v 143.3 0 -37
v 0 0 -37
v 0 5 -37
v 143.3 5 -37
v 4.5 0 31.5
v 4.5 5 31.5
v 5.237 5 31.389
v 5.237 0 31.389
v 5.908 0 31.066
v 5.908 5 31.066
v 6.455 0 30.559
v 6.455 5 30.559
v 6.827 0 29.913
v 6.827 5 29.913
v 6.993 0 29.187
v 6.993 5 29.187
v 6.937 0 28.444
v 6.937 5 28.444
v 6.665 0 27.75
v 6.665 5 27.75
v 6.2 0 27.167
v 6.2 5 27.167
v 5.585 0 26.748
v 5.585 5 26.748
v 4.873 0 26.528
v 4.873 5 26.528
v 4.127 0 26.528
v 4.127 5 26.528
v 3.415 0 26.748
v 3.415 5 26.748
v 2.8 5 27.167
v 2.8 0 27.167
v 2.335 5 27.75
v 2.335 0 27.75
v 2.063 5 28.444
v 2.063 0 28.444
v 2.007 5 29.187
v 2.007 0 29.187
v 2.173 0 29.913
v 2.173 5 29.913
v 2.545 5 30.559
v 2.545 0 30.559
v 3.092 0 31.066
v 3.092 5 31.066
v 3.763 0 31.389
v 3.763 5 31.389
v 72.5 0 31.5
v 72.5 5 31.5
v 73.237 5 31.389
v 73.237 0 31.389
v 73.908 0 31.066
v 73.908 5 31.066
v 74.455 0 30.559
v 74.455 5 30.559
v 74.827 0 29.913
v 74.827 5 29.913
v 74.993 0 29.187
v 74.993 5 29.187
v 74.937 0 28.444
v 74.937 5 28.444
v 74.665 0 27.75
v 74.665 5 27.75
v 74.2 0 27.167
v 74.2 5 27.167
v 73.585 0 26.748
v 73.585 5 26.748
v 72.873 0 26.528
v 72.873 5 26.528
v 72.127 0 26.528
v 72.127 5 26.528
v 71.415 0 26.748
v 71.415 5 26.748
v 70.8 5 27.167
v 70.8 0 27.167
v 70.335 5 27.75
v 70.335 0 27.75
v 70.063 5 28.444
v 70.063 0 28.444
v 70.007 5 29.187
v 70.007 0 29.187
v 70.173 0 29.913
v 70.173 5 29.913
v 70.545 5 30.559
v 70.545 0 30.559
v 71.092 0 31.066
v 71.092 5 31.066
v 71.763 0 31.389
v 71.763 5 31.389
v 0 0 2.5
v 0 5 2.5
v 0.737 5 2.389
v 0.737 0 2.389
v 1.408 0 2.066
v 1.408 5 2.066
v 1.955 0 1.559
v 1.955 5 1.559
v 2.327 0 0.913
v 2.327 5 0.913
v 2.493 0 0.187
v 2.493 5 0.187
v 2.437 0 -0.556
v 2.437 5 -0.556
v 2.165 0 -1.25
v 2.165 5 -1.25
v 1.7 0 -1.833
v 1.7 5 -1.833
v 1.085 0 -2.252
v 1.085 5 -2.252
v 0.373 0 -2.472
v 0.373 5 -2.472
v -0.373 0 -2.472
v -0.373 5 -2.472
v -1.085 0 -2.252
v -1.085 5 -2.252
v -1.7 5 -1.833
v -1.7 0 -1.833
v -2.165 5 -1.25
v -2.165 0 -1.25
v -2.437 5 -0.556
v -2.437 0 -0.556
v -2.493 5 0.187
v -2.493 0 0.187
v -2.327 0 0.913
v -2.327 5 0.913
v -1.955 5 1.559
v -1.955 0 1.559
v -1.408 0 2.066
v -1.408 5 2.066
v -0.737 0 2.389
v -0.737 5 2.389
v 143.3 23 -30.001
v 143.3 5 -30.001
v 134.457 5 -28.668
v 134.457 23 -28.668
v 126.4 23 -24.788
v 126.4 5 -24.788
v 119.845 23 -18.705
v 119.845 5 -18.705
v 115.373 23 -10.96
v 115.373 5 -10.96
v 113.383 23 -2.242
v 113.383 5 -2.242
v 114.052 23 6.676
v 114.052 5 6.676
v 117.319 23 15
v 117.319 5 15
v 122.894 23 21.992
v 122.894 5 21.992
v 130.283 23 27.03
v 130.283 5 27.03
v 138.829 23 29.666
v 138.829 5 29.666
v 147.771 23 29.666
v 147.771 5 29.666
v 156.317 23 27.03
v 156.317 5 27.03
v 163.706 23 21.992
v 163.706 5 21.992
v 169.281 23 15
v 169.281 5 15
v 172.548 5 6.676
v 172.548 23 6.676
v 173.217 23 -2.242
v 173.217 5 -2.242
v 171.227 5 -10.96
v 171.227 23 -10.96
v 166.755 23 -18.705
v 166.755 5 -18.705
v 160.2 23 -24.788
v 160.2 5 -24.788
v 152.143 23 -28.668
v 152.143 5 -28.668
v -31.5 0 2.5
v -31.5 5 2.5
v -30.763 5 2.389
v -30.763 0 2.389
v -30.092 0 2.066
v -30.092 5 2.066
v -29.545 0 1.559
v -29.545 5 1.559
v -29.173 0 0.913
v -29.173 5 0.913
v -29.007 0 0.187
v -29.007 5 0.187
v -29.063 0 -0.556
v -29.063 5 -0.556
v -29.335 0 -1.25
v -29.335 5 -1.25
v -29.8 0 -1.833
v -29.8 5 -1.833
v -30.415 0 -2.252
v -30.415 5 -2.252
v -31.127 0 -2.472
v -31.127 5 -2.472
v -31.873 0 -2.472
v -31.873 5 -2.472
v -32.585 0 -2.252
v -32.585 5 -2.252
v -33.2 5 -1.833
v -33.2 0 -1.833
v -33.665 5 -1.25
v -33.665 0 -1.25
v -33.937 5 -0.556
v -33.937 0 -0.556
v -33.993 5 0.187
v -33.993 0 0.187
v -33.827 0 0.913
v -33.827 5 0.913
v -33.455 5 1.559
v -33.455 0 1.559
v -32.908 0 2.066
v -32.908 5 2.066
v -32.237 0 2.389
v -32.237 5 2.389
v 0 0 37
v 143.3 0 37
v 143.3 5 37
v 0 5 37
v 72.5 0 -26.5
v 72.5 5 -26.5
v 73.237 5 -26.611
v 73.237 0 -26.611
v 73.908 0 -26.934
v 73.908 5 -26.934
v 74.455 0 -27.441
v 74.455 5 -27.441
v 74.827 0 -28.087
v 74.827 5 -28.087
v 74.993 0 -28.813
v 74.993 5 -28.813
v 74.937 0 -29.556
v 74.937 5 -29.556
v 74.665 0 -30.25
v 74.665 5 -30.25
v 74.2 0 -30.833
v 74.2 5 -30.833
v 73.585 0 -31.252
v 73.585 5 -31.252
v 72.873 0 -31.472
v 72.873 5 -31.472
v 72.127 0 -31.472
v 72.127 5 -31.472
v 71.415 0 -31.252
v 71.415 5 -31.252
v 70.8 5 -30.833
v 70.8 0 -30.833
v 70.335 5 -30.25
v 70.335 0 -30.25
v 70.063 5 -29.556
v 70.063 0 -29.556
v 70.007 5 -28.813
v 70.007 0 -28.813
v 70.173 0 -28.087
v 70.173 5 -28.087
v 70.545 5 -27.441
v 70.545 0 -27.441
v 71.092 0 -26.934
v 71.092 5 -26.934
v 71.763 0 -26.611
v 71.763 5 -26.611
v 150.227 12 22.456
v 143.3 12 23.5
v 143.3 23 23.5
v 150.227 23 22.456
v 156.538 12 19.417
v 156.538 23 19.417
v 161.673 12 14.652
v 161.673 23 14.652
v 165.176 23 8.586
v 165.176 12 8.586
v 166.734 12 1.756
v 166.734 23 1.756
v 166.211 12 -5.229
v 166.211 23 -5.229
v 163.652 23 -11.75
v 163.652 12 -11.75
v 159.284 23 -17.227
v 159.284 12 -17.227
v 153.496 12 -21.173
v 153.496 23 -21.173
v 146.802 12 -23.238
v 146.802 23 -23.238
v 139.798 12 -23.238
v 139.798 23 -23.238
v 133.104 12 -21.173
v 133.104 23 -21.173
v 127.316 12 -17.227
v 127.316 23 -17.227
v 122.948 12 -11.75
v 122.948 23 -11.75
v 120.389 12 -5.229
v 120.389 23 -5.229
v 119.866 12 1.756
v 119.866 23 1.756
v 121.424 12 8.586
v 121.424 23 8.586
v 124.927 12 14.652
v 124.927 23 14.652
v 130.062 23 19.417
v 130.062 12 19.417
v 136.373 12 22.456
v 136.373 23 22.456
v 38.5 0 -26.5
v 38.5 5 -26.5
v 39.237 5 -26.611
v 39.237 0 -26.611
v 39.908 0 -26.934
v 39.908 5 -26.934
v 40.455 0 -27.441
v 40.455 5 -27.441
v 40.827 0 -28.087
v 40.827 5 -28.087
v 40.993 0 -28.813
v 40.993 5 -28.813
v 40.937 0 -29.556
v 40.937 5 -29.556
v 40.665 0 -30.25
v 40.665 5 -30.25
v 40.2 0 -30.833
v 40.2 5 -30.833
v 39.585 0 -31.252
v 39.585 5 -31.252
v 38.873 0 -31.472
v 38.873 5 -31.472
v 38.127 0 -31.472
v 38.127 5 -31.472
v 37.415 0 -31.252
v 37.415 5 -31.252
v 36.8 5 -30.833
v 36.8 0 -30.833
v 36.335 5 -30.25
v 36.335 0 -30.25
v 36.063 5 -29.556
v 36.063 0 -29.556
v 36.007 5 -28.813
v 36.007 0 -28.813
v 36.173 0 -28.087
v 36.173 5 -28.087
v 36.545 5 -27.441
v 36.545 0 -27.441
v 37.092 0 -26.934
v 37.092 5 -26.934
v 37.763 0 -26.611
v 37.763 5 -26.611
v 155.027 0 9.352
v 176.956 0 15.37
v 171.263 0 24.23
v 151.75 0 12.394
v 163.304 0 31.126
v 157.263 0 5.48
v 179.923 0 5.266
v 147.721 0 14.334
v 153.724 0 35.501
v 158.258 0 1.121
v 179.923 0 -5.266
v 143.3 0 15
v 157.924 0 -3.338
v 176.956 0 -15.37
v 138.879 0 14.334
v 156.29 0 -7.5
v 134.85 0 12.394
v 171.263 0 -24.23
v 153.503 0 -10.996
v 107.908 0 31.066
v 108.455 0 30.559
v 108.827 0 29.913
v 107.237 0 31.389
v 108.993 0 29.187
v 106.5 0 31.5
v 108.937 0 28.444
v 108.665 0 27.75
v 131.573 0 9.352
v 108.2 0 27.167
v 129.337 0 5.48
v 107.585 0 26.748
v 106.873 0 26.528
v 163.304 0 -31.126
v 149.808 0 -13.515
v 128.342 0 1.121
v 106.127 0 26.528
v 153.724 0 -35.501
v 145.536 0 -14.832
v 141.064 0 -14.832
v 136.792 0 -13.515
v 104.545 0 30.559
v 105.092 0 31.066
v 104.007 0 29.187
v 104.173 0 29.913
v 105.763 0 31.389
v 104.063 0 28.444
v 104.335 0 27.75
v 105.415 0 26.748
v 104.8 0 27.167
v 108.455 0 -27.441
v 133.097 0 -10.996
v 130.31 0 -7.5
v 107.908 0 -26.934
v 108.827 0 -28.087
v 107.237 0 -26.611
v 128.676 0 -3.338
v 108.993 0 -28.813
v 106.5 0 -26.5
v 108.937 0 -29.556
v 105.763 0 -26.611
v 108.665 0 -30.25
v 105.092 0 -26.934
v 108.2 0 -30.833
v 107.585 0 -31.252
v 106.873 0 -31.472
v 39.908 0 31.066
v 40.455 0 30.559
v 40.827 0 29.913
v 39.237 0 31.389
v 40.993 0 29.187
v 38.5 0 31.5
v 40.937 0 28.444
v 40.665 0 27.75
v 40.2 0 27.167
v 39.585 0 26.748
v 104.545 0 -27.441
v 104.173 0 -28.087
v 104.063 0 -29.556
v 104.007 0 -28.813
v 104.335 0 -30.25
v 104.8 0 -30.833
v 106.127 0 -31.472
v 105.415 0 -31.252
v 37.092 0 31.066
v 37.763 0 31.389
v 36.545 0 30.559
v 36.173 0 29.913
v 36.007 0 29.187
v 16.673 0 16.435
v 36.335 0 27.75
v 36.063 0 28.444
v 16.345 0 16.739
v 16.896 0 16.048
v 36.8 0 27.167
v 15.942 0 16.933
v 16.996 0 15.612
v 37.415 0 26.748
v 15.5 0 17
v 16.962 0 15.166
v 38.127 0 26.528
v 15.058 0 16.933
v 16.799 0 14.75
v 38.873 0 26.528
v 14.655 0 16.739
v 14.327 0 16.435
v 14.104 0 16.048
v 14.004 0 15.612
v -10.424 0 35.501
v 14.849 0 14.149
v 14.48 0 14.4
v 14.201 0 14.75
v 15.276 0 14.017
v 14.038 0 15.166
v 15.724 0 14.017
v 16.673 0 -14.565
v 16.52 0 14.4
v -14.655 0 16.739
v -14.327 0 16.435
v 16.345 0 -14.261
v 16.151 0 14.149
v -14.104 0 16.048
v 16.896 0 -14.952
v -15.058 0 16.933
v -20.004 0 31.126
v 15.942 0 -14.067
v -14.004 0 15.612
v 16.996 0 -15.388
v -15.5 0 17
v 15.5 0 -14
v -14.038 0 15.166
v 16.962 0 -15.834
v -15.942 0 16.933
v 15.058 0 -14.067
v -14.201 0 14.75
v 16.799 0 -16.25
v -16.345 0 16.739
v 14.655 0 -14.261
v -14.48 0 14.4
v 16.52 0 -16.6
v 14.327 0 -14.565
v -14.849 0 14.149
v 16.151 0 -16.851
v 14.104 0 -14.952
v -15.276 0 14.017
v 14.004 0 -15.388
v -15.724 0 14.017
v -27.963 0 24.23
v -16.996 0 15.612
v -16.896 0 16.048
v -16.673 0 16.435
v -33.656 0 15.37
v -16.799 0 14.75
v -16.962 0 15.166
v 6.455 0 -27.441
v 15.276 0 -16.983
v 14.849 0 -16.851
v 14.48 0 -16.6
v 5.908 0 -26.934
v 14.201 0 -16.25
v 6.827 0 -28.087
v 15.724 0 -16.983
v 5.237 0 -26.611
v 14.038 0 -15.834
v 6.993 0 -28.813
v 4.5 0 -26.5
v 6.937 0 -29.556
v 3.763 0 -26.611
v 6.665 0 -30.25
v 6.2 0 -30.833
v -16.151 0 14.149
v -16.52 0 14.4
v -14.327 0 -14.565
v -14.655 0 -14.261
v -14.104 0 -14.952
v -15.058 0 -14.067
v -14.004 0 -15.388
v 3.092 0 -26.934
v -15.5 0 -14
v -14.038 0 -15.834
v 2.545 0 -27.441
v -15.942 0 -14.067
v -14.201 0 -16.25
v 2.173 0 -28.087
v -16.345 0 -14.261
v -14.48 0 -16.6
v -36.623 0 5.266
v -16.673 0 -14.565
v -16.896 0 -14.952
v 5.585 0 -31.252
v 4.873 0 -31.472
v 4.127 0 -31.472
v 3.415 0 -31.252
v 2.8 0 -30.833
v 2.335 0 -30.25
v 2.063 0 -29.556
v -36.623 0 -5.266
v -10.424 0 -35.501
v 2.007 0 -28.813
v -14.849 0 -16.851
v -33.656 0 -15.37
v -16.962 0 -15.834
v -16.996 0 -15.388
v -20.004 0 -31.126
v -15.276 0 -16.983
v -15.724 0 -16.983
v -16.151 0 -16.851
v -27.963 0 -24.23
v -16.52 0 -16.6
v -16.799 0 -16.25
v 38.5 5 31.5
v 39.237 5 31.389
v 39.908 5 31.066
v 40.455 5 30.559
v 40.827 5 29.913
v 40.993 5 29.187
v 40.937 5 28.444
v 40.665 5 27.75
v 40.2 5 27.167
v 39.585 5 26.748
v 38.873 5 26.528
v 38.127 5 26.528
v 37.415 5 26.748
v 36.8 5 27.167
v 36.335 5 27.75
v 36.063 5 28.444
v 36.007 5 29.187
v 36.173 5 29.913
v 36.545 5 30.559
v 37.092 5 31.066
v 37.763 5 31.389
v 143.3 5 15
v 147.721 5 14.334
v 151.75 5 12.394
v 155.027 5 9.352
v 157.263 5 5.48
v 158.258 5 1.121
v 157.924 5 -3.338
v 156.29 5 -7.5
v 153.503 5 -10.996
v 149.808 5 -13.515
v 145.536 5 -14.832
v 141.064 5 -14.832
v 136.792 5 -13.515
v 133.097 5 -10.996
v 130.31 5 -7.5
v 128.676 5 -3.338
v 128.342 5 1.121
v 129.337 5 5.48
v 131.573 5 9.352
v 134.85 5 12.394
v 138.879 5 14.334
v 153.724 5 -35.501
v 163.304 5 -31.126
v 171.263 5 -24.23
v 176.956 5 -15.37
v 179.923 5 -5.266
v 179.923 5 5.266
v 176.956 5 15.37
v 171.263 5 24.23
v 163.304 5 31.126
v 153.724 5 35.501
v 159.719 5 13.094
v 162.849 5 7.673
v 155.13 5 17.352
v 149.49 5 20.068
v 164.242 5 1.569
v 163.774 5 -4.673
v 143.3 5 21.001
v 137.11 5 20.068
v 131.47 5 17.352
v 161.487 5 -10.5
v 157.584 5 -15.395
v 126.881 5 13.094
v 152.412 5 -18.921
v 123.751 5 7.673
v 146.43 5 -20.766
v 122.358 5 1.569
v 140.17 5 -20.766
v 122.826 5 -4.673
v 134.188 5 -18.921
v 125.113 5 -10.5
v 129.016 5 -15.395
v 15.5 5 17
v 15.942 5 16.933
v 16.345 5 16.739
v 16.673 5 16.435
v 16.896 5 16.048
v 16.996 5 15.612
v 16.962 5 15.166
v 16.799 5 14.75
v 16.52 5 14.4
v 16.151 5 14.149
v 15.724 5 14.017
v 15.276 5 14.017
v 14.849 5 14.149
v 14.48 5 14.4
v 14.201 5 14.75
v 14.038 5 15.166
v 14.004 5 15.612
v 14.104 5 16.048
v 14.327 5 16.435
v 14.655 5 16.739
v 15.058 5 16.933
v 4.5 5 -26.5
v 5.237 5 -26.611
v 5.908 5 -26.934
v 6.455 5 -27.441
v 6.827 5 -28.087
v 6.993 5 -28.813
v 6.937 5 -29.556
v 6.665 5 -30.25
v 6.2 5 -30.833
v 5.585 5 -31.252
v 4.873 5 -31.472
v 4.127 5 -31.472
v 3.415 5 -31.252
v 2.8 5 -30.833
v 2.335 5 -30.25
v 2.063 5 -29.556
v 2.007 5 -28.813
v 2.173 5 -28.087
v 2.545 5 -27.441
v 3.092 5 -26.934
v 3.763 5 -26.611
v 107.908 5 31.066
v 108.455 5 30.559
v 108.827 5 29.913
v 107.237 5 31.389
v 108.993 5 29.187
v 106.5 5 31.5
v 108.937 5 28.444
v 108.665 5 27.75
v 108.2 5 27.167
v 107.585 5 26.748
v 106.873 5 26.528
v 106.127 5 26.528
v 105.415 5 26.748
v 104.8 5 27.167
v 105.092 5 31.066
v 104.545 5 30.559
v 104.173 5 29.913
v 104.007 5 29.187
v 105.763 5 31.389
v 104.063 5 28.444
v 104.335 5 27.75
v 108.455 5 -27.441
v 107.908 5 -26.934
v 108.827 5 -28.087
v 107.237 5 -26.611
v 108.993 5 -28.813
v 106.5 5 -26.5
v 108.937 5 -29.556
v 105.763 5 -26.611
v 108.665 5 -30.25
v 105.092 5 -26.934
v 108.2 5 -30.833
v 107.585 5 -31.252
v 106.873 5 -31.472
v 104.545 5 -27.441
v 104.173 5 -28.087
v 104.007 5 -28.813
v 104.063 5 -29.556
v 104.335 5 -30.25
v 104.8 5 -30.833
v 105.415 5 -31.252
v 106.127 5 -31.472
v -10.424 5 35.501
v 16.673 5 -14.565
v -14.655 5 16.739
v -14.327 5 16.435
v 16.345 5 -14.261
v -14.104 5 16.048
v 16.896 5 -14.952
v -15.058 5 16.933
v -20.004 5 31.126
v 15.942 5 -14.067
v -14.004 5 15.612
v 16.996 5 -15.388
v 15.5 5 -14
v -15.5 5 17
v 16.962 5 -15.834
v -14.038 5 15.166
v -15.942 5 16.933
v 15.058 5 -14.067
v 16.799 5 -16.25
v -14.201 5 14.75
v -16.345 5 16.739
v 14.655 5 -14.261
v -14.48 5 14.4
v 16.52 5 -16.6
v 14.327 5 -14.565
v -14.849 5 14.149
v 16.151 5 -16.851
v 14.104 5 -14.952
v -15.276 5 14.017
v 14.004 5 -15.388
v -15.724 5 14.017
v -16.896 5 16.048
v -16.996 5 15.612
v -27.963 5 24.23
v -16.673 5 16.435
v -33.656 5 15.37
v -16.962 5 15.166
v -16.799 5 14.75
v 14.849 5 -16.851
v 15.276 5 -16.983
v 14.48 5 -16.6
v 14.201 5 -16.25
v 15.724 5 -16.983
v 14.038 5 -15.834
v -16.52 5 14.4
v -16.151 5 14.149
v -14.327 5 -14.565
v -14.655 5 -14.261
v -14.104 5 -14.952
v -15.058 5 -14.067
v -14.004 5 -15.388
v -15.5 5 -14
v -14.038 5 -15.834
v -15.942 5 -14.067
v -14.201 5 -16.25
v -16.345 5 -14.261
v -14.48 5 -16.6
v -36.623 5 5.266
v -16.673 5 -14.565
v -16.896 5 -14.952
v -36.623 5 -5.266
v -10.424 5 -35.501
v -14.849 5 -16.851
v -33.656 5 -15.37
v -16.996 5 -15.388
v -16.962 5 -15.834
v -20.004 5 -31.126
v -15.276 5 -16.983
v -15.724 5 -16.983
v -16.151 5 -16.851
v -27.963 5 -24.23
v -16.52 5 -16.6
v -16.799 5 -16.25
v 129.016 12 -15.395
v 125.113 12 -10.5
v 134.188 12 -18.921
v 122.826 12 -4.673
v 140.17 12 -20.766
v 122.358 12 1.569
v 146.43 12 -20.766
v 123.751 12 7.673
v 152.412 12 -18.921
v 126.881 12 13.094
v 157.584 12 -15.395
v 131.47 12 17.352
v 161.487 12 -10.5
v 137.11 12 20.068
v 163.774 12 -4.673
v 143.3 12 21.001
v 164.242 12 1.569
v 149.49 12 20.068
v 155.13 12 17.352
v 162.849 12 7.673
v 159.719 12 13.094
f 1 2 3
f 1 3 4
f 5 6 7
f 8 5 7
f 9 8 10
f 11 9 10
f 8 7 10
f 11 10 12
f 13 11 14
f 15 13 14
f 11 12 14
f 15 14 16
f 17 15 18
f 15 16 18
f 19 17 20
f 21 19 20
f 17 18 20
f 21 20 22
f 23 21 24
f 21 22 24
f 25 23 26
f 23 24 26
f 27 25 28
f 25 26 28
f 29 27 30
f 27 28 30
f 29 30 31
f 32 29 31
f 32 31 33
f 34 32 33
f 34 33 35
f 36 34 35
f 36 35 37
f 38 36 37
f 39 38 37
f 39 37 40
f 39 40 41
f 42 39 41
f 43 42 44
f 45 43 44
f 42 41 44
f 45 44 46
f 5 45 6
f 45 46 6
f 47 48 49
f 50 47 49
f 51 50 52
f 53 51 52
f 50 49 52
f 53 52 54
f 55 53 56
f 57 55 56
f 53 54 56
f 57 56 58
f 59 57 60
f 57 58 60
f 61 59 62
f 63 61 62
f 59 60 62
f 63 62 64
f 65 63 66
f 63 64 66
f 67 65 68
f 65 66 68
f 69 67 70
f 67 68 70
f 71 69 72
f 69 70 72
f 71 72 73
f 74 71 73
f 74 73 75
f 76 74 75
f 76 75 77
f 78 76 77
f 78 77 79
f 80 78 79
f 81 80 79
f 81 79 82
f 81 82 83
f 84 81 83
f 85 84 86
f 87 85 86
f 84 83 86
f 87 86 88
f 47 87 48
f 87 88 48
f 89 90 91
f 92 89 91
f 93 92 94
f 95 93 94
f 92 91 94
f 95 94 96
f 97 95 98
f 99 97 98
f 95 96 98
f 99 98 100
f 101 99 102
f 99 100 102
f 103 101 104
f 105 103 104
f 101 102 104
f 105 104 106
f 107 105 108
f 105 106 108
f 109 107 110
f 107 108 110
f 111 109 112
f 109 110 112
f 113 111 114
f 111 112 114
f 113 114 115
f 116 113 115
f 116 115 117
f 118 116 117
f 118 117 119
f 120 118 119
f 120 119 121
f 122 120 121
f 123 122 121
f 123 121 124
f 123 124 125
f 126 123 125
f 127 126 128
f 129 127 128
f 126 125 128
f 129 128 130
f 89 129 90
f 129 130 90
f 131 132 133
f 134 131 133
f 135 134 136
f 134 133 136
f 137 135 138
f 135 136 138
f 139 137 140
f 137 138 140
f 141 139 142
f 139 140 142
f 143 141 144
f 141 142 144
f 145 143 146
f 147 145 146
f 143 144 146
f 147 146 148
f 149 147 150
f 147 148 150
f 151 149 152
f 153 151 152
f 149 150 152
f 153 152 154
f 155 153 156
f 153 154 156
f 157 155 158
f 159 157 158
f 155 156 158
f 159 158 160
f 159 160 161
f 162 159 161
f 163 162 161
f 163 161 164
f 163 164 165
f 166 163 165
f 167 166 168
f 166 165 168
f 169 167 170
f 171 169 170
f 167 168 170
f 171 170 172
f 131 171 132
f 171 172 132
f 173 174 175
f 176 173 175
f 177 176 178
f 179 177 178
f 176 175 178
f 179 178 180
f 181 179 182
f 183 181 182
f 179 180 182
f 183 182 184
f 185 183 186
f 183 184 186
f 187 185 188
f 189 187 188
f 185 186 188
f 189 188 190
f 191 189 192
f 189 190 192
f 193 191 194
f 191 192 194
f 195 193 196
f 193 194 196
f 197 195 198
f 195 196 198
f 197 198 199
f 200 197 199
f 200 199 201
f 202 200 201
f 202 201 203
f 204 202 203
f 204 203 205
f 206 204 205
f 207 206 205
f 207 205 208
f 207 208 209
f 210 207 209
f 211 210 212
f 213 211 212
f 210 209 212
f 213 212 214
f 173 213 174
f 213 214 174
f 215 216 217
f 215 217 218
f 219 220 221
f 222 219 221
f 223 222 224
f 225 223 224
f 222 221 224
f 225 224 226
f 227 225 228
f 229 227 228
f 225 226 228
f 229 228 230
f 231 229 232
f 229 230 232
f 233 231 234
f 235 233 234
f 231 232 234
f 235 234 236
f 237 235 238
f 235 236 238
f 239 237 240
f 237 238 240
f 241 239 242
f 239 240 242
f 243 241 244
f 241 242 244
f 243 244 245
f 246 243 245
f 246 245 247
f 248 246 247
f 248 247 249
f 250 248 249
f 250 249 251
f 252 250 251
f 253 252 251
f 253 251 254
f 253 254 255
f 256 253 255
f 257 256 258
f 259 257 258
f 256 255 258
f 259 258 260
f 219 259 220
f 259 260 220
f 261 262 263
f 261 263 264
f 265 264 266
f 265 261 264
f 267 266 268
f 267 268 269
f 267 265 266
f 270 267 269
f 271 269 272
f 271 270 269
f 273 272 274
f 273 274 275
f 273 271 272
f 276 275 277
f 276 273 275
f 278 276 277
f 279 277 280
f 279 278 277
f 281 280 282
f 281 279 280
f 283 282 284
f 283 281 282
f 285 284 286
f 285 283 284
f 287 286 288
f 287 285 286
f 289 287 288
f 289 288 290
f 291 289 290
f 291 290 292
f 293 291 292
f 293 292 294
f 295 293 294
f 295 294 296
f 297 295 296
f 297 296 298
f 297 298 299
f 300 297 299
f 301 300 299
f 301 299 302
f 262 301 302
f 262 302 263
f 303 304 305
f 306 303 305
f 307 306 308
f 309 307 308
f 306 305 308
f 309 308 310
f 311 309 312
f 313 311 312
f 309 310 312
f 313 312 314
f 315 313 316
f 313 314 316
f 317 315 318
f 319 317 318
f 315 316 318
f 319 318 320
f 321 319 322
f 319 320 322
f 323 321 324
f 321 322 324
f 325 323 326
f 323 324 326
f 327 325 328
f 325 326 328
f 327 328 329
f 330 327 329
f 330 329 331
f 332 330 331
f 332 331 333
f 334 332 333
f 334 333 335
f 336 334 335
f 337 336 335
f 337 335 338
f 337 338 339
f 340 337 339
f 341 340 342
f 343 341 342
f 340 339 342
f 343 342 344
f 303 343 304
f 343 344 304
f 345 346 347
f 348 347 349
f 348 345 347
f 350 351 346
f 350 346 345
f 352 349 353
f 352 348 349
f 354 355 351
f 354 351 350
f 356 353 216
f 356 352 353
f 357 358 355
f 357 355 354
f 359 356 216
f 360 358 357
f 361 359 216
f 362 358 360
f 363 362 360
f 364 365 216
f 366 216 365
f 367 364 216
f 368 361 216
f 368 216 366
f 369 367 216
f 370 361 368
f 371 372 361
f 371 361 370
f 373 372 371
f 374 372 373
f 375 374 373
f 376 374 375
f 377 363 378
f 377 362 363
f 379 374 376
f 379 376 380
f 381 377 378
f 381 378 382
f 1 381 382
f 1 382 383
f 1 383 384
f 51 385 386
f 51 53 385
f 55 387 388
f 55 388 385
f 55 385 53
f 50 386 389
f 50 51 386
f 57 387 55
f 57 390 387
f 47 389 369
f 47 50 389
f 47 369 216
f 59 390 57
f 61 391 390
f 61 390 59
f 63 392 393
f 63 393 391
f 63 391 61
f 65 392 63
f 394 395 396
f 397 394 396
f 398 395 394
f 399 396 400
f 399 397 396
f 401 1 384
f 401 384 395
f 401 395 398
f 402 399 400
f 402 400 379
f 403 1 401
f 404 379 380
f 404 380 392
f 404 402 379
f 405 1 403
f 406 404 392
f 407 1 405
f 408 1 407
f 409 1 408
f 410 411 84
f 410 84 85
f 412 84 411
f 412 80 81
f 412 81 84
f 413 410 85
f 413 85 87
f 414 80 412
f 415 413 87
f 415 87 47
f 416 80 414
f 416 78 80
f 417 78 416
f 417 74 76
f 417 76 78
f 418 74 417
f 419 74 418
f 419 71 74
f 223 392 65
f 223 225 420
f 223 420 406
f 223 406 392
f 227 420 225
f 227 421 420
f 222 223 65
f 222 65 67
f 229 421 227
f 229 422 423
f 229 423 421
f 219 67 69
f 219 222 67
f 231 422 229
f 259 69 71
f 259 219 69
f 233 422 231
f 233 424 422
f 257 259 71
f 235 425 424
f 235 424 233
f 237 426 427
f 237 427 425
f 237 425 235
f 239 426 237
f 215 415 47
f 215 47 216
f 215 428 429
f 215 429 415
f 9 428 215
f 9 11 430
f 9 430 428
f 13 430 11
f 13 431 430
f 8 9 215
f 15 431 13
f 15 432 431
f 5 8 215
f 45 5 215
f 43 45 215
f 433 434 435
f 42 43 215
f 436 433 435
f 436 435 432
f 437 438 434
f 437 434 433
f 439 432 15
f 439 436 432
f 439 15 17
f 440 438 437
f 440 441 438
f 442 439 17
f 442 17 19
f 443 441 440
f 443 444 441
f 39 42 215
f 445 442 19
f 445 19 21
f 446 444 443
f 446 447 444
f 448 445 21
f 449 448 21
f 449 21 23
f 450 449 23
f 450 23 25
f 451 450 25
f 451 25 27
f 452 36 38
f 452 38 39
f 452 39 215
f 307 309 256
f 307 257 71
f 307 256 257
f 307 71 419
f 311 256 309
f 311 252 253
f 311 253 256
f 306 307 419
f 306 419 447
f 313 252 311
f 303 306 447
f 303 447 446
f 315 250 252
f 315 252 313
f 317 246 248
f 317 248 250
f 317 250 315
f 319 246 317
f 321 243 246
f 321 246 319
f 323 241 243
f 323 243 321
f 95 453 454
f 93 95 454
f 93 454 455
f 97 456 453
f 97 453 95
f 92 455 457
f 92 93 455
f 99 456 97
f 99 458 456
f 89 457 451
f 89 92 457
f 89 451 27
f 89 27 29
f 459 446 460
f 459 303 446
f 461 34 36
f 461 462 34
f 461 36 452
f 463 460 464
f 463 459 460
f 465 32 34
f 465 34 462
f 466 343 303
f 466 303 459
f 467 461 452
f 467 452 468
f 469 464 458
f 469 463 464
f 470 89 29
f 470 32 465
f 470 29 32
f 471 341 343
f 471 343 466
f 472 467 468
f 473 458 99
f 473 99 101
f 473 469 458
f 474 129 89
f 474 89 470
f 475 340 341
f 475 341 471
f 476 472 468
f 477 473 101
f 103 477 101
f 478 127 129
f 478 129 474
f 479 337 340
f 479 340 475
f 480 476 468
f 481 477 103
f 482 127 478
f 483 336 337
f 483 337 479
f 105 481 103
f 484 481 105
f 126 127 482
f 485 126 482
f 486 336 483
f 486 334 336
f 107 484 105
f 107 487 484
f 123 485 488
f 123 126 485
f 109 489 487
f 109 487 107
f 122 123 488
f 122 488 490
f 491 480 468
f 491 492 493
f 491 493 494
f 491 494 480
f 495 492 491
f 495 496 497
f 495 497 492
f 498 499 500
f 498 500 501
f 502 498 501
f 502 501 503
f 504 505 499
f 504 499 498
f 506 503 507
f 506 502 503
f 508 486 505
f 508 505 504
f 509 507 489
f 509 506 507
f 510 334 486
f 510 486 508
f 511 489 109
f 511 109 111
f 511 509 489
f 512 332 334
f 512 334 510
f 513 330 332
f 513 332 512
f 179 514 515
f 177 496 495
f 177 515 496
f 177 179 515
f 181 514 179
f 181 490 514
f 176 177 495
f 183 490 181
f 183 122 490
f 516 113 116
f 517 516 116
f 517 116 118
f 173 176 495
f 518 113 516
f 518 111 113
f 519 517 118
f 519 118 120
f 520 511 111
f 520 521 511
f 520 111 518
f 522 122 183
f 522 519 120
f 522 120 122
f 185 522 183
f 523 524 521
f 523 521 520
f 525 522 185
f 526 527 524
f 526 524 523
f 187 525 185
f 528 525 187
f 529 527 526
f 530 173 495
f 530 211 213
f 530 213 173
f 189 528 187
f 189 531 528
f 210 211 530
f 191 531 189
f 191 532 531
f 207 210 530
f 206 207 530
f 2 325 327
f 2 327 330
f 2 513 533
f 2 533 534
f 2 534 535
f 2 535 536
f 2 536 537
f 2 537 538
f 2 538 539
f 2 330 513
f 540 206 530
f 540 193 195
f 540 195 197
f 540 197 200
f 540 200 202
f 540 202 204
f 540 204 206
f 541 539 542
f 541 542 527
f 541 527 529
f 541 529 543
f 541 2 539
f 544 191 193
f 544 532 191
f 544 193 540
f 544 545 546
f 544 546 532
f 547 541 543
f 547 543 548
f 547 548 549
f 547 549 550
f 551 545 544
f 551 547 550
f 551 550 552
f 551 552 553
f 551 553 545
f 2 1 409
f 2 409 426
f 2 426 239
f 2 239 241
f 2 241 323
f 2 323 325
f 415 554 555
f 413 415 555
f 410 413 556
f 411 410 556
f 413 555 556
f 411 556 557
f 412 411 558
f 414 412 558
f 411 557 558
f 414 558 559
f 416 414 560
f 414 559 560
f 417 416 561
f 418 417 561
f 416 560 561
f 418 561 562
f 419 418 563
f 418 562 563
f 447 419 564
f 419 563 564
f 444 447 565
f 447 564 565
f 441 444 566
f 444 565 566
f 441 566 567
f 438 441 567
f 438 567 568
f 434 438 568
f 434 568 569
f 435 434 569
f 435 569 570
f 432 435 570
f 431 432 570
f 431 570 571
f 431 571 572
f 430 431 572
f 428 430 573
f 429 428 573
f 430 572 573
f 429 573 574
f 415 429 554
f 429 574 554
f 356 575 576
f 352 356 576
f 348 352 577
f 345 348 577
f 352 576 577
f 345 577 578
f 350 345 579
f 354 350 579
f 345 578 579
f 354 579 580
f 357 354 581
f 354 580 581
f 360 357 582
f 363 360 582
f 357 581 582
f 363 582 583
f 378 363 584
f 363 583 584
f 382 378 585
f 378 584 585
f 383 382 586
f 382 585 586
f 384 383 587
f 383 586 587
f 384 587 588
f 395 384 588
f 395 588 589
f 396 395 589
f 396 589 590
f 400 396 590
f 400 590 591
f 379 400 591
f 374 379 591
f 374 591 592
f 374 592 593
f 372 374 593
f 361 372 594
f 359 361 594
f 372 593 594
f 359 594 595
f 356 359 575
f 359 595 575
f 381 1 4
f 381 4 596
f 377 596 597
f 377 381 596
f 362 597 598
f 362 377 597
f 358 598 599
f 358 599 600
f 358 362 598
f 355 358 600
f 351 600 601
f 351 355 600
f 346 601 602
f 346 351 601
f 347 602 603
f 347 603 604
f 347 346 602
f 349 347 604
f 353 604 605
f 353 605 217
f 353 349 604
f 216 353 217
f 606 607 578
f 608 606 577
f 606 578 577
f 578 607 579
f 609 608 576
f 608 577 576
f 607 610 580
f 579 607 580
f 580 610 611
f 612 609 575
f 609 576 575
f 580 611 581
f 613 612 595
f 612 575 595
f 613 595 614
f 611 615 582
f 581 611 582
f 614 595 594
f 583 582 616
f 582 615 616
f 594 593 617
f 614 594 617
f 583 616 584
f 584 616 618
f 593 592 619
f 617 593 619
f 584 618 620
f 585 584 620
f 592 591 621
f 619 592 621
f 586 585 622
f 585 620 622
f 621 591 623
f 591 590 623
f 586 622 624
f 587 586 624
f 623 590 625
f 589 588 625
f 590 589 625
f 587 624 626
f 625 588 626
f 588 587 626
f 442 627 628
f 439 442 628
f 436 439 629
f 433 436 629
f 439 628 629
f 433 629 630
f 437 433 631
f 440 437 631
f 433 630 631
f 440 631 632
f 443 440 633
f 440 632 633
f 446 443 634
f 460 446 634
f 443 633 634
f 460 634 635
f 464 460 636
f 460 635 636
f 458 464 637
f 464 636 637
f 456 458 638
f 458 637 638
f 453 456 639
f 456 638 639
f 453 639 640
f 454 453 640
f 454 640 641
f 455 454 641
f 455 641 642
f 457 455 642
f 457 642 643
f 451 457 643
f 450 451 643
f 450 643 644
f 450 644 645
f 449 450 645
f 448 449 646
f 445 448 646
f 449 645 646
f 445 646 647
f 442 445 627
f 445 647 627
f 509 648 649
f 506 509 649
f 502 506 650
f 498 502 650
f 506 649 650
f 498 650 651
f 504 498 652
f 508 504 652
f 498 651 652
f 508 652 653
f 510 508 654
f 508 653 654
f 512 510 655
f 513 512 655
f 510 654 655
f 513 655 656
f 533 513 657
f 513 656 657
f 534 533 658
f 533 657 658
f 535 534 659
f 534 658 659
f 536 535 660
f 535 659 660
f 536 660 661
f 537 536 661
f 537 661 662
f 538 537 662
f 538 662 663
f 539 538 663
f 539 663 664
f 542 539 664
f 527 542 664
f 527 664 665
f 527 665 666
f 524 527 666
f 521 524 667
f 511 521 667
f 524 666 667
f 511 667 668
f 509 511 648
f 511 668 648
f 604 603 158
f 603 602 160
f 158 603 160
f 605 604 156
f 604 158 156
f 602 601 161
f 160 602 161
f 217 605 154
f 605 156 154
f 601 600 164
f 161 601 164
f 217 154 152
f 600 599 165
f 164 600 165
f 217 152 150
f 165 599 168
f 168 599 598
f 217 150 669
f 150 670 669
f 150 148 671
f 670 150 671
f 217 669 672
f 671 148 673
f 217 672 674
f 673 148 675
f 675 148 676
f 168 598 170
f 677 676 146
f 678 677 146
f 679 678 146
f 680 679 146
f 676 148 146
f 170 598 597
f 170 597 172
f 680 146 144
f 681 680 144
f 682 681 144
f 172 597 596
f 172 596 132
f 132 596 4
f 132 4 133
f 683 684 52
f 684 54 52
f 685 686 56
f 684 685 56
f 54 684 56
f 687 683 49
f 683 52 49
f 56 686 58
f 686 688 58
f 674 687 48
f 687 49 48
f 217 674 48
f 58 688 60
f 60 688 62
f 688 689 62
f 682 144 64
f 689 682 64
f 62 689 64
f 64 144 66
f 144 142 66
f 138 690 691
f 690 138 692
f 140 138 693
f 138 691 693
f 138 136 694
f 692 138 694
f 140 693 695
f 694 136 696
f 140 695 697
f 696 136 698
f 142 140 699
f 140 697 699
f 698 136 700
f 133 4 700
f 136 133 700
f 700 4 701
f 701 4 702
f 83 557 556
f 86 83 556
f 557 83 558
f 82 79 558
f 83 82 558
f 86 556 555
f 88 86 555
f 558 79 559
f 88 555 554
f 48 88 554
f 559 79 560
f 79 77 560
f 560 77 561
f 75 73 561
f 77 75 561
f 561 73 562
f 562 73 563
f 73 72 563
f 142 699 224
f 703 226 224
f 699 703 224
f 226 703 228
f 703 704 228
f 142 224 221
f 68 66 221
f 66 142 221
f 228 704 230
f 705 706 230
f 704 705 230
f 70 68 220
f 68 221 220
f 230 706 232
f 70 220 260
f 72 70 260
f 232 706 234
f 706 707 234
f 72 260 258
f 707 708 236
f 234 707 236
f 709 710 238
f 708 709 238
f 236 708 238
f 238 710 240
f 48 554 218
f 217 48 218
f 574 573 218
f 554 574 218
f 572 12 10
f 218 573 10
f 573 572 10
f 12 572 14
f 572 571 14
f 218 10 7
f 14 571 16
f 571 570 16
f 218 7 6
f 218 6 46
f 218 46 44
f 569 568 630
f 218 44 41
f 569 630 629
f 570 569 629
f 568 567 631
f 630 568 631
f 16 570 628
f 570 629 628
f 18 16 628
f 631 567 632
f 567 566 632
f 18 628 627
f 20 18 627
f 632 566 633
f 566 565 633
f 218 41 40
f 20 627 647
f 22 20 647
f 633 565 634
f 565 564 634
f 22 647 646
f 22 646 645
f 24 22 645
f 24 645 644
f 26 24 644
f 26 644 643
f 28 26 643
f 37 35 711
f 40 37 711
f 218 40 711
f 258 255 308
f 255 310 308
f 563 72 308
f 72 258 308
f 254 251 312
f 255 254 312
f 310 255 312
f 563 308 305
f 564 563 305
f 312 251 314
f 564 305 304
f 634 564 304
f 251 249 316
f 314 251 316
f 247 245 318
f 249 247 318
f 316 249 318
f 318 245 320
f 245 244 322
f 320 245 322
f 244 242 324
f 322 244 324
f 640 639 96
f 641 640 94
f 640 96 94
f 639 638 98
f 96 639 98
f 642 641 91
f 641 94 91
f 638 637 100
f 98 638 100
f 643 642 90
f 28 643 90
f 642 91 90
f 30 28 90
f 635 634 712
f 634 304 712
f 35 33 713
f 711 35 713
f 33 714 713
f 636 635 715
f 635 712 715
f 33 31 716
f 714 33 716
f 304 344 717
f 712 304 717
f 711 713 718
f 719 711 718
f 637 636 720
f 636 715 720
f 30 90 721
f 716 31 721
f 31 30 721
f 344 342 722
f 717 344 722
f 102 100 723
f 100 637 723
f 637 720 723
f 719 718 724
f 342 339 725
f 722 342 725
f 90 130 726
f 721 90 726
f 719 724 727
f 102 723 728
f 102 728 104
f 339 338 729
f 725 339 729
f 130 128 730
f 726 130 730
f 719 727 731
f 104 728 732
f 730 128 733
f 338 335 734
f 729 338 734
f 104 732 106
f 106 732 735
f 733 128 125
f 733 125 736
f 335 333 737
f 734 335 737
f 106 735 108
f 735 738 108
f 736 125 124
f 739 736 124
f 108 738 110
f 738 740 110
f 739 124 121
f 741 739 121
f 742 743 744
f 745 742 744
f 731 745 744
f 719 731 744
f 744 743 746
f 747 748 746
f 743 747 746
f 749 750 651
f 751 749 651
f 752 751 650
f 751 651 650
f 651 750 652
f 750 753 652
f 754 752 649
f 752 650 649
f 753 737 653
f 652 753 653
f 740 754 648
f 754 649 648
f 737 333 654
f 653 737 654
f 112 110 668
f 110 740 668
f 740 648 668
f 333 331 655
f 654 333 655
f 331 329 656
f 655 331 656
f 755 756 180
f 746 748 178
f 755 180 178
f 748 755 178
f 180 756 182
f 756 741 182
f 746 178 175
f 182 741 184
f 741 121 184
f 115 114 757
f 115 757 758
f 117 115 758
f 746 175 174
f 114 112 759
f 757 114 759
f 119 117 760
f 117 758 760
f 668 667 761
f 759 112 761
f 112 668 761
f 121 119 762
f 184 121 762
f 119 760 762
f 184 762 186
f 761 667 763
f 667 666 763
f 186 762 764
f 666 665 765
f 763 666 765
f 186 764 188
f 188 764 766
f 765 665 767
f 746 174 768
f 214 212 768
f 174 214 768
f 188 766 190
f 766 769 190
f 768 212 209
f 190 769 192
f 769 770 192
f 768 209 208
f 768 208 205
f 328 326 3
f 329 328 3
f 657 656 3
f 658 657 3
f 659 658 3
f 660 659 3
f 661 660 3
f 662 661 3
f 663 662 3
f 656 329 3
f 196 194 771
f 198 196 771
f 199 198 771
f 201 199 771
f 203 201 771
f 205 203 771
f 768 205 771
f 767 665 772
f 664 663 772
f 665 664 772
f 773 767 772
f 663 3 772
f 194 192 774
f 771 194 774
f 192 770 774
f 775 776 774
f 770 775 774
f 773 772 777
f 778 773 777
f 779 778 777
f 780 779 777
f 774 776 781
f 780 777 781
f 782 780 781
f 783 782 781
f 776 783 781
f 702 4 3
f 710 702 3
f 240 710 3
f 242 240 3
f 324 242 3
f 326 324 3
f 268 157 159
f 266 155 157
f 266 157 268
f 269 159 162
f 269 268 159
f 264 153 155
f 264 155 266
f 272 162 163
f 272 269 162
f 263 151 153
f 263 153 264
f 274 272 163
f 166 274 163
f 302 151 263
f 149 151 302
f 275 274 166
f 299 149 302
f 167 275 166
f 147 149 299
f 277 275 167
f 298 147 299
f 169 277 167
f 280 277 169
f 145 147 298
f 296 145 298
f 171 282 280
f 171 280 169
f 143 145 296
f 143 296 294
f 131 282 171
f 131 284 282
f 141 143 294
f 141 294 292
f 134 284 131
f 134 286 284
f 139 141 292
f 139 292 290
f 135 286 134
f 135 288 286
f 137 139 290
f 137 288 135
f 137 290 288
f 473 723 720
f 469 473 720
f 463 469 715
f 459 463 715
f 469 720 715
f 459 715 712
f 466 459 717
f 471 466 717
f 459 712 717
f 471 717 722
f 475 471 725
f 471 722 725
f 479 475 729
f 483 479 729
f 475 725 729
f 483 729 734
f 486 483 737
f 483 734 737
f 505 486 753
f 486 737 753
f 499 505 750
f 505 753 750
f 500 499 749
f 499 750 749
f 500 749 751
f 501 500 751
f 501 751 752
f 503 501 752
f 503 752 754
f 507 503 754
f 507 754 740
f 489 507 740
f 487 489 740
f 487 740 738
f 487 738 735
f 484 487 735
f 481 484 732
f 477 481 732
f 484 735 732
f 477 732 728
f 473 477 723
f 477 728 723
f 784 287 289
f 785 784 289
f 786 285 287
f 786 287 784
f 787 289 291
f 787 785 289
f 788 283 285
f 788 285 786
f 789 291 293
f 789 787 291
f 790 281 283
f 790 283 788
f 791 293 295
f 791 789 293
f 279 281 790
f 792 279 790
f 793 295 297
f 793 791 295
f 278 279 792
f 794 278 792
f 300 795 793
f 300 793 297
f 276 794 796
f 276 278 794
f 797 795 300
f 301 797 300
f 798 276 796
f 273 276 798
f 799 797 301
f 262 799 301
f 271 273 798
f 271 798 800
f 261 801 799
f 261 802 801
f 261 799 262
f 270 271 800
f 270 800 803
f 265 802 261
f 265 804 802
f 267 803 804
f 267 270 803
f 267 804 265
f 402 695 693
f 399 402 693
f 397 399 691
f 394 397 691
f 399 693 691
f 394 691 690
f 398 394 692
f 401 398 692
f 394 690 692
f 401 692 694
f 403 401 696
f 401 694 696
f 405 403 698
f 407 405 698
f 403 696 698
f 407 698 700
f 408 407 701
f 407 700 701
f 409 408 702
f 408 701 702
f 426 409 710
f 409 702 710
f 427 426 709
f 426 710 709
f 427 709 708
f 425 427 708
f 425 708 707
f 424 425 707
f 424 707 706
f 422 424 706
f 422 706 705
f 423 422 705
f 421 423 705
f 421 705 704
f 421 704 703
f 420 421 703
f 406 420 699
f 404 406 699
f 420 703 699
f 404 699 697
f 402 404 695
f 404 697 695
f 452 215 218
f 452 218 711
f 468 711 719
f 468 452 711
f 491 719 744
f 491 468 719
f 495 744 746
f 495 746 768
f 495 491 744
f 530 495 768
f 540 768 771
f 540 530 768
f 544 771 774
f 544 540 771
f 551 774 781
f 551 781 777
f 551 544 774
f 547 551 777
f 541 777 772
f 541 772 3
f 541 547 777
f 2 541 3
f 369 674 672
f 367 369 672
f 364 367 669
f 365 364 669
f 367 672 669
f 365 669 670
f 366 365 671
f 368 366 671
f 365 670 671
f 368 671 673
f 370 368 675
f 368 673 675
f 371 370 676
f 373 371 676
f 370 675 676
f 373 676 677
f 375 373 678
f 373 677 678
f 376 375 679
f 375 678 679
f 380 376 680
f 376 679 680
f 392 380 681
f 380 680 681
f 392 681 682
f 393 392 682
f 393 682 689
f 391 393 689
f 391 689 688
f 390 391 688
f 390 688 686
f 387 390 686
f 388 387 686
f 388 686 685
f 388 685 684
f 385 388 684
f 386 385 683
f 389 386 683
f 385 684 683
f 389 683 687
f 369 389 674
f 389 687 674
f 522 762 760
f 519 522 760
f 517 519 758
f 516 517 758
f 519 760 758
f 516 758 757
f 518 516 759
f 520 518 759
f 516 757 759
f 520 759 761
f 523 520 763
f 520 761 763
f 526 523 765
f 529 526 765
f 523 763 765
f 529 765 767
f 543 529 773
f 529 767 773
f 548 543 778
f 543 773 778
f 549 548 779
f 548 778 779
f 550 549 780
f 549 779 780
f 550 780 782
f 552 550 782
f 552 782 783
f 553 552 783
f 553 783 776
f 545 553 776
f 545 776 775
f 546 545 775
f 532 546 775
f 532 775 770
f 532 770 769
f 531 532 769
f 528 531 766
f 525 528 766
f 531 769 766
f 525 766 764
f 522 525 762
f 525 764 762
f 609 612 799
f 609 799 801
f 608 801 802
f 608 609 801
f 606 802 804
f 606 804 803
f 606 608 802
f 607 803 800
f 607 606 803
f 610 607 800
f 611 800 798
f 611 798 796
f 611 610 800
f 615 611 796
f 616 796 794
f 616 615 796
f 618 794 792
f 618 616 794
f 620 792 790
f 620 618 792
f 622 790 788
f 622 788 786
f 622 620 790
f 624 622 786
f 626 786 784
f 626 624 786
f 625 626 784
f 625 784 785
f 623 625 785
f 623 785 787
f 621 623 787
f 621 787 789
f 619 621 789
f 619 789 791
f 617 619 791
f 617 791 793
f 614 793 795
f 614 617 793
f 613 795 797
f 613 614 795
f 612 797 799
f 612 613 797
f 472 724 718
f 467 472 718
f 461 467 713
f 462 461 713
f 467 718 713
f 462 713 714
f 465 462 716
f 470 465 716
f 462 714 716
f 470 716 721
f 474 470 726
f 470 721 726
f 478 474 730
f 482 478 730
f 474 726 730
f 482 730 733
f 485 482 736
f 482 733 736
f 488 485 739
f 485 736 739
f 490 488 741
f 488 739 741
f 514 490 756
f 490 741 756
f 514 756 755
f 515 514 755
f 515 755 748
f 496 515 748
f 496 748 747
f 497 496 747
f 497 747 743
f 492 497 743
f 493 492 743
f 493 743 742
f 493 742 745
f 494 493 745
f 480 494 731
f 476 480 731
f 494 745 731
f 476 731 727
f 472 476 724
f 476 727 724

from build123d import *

# Parameters (mm, degrees)
BOSS_EXTRUDE1_DEPTH = 5
SKETCH2_R           = 2.5
SKETCH2_R_2         = 1.5
SKETCH2_R_3         = 15
CUT_EXTRUDE1_DEPTH  = 5
SKETCH3_R           = 2.5
CUT_EXTRUDE2_DEPTH  = 5
SKETCH4_R           = 23.5
SKETCH4_R_2         = 21.000952359
BOSS_EXTRUDE2_DEPTH = 7
SKETCH5_R           = 30.000666659
SKETCH5_R_2         = 23.5
BOSS_EXTRUDE3_DEPTH = 18


with BuildPart() as part:
    # Sketch1 → Boss-Extrude1 (new body)
    with BuildSketch(Plane(origin=(0, 0, 0), x_dir=(1, 0, 0), z_dir=(0, 1, 0))):
        with BuildLine():
            Line((0, 37), (143.3, 37))
            ThreePointArc((143.3, 37), (180.3, 0), (143.3, -37))
            Line((143.3, -37), (0, -37))
            ThreePointArc((0, -37), (-37, 0), (0, 37))
        make_face()
    extrude(amount=BOSS_EXTRUDE1_DEPTH)

    # Sketch2 → Cut-Extrude1 (cut)
    with BuildSketch(Plane(origin=(0, 5, 0), x_dir=(1, 0, 0), z_dir=(0, 1, 0))):
        with Locations(Location((0, 0, 0), (0, 0, 270))):
            Circle(SKETCH2_R)
        with Locations(Location((-15.5, 15.5, 0), (0, 0, 270))):
            Circle(SKETCH2_R_2)
        with Locations(Location((15.5, 15.5, 0), (0, 0, 270))):
            Circle(SKETCH2_R_2)
        with Locations(Location((15.5, -15.5, 0), (0, 0, 270))):
            Circle(SKETCH2_R_2)
        with Locations(Location((-15.5, -15.5, 0), (0, 0, 270))):
            Circle(SKETCH2_R_2)
        with Locations(Location((143.3, 0, 0), (0, 0, 270))):
            Circle(SKETCH2_R_3)
    extrude(amount=-CUT_EXTRUDE1_DEPTH, mode=Mode.SUBTRACT)

    # Sketch3 → Cut-Extrude2 (cut)
    with BuildSketch(Plane(origin=(0, 5, 0), x_dir=(1, 0, 0), z_dir=(0, 1, 0))):
        with Locations(Location((-31.5, 0, 0), (0, 0, 270))):
            Circle(SKETCH3_R)
        with Locations(Location((4.5, -29, 0), (0, 0, 270))):
            Circle(SKETCH3_R)
        with Locations(Location((38.5, -29, 0), (0, 0, 270))):
            Circle(SKETCH3_R)
        with Locations(Location((72.5, -29, 0), (0, 0, 270))):
            Circle(SKETCH3_R)
        with Locations(Location((106.5, -29, 0), (0, 0, 270))):
            Circle(SKETCH3_R)
        with Locations(Location((4.5, 29, 0), (0, 0, 270))):
            Circle(SKETCH3_R)
        with Locations(Location((38.5, 29, 0), (0, 0, 270))):
            Circle(SKETCH3_R)
        with Locations(Location((72.5, 29, 0), (0, 0, 270))):
            Circle(SKETCH3_R)
        with Locations(Location((106.5, 29, 0), (0, 0, 270))):
            Circle(SKETCH3_R)
    extrude(amount=-CUT_EXTRUDE2_DEPTH, mode=Mode.SUBTRACT)

    # Sketch4 → Boss-Extrude2 (add)
    with BuildSketch(Plane(origin=(0, 5, 0), x_dir=(1, 0, 0), z_dir=(0, 1, 0))):
        with Locations(Location((143.3, 0, 0), (0, 0, 270))):
            Circle(SKETCH4_R)
        with Locations(Location((143.3, 0, 0), (0, 0, 270))):
            Circle(SKETCH4_R_2, mode=Mode.SUBTRACT)
    extrude(amount=BOSS_EXTRUDE2_DEPTH)

    # Sketch5 → Boss-Extrude3 (add)
    with BuildSketch(Plane(origin=(0, 5, 0), x_dir=(1, 0, 0), z_dir=(0, 1, 0))):
        with Locations(Location((143.3, 0, 0), (0, 0, 90))):
            Circle(SKETCH5_R)
        with Locations(Location((143.3, 0, 0), (0, 0, 270))):
            Circle(SKETCH5_R_2, mode=Mode.SUBTRACT)
    extrude(amount=BOSS_EXTRUDE3_DEPTH)


solid = part.part
